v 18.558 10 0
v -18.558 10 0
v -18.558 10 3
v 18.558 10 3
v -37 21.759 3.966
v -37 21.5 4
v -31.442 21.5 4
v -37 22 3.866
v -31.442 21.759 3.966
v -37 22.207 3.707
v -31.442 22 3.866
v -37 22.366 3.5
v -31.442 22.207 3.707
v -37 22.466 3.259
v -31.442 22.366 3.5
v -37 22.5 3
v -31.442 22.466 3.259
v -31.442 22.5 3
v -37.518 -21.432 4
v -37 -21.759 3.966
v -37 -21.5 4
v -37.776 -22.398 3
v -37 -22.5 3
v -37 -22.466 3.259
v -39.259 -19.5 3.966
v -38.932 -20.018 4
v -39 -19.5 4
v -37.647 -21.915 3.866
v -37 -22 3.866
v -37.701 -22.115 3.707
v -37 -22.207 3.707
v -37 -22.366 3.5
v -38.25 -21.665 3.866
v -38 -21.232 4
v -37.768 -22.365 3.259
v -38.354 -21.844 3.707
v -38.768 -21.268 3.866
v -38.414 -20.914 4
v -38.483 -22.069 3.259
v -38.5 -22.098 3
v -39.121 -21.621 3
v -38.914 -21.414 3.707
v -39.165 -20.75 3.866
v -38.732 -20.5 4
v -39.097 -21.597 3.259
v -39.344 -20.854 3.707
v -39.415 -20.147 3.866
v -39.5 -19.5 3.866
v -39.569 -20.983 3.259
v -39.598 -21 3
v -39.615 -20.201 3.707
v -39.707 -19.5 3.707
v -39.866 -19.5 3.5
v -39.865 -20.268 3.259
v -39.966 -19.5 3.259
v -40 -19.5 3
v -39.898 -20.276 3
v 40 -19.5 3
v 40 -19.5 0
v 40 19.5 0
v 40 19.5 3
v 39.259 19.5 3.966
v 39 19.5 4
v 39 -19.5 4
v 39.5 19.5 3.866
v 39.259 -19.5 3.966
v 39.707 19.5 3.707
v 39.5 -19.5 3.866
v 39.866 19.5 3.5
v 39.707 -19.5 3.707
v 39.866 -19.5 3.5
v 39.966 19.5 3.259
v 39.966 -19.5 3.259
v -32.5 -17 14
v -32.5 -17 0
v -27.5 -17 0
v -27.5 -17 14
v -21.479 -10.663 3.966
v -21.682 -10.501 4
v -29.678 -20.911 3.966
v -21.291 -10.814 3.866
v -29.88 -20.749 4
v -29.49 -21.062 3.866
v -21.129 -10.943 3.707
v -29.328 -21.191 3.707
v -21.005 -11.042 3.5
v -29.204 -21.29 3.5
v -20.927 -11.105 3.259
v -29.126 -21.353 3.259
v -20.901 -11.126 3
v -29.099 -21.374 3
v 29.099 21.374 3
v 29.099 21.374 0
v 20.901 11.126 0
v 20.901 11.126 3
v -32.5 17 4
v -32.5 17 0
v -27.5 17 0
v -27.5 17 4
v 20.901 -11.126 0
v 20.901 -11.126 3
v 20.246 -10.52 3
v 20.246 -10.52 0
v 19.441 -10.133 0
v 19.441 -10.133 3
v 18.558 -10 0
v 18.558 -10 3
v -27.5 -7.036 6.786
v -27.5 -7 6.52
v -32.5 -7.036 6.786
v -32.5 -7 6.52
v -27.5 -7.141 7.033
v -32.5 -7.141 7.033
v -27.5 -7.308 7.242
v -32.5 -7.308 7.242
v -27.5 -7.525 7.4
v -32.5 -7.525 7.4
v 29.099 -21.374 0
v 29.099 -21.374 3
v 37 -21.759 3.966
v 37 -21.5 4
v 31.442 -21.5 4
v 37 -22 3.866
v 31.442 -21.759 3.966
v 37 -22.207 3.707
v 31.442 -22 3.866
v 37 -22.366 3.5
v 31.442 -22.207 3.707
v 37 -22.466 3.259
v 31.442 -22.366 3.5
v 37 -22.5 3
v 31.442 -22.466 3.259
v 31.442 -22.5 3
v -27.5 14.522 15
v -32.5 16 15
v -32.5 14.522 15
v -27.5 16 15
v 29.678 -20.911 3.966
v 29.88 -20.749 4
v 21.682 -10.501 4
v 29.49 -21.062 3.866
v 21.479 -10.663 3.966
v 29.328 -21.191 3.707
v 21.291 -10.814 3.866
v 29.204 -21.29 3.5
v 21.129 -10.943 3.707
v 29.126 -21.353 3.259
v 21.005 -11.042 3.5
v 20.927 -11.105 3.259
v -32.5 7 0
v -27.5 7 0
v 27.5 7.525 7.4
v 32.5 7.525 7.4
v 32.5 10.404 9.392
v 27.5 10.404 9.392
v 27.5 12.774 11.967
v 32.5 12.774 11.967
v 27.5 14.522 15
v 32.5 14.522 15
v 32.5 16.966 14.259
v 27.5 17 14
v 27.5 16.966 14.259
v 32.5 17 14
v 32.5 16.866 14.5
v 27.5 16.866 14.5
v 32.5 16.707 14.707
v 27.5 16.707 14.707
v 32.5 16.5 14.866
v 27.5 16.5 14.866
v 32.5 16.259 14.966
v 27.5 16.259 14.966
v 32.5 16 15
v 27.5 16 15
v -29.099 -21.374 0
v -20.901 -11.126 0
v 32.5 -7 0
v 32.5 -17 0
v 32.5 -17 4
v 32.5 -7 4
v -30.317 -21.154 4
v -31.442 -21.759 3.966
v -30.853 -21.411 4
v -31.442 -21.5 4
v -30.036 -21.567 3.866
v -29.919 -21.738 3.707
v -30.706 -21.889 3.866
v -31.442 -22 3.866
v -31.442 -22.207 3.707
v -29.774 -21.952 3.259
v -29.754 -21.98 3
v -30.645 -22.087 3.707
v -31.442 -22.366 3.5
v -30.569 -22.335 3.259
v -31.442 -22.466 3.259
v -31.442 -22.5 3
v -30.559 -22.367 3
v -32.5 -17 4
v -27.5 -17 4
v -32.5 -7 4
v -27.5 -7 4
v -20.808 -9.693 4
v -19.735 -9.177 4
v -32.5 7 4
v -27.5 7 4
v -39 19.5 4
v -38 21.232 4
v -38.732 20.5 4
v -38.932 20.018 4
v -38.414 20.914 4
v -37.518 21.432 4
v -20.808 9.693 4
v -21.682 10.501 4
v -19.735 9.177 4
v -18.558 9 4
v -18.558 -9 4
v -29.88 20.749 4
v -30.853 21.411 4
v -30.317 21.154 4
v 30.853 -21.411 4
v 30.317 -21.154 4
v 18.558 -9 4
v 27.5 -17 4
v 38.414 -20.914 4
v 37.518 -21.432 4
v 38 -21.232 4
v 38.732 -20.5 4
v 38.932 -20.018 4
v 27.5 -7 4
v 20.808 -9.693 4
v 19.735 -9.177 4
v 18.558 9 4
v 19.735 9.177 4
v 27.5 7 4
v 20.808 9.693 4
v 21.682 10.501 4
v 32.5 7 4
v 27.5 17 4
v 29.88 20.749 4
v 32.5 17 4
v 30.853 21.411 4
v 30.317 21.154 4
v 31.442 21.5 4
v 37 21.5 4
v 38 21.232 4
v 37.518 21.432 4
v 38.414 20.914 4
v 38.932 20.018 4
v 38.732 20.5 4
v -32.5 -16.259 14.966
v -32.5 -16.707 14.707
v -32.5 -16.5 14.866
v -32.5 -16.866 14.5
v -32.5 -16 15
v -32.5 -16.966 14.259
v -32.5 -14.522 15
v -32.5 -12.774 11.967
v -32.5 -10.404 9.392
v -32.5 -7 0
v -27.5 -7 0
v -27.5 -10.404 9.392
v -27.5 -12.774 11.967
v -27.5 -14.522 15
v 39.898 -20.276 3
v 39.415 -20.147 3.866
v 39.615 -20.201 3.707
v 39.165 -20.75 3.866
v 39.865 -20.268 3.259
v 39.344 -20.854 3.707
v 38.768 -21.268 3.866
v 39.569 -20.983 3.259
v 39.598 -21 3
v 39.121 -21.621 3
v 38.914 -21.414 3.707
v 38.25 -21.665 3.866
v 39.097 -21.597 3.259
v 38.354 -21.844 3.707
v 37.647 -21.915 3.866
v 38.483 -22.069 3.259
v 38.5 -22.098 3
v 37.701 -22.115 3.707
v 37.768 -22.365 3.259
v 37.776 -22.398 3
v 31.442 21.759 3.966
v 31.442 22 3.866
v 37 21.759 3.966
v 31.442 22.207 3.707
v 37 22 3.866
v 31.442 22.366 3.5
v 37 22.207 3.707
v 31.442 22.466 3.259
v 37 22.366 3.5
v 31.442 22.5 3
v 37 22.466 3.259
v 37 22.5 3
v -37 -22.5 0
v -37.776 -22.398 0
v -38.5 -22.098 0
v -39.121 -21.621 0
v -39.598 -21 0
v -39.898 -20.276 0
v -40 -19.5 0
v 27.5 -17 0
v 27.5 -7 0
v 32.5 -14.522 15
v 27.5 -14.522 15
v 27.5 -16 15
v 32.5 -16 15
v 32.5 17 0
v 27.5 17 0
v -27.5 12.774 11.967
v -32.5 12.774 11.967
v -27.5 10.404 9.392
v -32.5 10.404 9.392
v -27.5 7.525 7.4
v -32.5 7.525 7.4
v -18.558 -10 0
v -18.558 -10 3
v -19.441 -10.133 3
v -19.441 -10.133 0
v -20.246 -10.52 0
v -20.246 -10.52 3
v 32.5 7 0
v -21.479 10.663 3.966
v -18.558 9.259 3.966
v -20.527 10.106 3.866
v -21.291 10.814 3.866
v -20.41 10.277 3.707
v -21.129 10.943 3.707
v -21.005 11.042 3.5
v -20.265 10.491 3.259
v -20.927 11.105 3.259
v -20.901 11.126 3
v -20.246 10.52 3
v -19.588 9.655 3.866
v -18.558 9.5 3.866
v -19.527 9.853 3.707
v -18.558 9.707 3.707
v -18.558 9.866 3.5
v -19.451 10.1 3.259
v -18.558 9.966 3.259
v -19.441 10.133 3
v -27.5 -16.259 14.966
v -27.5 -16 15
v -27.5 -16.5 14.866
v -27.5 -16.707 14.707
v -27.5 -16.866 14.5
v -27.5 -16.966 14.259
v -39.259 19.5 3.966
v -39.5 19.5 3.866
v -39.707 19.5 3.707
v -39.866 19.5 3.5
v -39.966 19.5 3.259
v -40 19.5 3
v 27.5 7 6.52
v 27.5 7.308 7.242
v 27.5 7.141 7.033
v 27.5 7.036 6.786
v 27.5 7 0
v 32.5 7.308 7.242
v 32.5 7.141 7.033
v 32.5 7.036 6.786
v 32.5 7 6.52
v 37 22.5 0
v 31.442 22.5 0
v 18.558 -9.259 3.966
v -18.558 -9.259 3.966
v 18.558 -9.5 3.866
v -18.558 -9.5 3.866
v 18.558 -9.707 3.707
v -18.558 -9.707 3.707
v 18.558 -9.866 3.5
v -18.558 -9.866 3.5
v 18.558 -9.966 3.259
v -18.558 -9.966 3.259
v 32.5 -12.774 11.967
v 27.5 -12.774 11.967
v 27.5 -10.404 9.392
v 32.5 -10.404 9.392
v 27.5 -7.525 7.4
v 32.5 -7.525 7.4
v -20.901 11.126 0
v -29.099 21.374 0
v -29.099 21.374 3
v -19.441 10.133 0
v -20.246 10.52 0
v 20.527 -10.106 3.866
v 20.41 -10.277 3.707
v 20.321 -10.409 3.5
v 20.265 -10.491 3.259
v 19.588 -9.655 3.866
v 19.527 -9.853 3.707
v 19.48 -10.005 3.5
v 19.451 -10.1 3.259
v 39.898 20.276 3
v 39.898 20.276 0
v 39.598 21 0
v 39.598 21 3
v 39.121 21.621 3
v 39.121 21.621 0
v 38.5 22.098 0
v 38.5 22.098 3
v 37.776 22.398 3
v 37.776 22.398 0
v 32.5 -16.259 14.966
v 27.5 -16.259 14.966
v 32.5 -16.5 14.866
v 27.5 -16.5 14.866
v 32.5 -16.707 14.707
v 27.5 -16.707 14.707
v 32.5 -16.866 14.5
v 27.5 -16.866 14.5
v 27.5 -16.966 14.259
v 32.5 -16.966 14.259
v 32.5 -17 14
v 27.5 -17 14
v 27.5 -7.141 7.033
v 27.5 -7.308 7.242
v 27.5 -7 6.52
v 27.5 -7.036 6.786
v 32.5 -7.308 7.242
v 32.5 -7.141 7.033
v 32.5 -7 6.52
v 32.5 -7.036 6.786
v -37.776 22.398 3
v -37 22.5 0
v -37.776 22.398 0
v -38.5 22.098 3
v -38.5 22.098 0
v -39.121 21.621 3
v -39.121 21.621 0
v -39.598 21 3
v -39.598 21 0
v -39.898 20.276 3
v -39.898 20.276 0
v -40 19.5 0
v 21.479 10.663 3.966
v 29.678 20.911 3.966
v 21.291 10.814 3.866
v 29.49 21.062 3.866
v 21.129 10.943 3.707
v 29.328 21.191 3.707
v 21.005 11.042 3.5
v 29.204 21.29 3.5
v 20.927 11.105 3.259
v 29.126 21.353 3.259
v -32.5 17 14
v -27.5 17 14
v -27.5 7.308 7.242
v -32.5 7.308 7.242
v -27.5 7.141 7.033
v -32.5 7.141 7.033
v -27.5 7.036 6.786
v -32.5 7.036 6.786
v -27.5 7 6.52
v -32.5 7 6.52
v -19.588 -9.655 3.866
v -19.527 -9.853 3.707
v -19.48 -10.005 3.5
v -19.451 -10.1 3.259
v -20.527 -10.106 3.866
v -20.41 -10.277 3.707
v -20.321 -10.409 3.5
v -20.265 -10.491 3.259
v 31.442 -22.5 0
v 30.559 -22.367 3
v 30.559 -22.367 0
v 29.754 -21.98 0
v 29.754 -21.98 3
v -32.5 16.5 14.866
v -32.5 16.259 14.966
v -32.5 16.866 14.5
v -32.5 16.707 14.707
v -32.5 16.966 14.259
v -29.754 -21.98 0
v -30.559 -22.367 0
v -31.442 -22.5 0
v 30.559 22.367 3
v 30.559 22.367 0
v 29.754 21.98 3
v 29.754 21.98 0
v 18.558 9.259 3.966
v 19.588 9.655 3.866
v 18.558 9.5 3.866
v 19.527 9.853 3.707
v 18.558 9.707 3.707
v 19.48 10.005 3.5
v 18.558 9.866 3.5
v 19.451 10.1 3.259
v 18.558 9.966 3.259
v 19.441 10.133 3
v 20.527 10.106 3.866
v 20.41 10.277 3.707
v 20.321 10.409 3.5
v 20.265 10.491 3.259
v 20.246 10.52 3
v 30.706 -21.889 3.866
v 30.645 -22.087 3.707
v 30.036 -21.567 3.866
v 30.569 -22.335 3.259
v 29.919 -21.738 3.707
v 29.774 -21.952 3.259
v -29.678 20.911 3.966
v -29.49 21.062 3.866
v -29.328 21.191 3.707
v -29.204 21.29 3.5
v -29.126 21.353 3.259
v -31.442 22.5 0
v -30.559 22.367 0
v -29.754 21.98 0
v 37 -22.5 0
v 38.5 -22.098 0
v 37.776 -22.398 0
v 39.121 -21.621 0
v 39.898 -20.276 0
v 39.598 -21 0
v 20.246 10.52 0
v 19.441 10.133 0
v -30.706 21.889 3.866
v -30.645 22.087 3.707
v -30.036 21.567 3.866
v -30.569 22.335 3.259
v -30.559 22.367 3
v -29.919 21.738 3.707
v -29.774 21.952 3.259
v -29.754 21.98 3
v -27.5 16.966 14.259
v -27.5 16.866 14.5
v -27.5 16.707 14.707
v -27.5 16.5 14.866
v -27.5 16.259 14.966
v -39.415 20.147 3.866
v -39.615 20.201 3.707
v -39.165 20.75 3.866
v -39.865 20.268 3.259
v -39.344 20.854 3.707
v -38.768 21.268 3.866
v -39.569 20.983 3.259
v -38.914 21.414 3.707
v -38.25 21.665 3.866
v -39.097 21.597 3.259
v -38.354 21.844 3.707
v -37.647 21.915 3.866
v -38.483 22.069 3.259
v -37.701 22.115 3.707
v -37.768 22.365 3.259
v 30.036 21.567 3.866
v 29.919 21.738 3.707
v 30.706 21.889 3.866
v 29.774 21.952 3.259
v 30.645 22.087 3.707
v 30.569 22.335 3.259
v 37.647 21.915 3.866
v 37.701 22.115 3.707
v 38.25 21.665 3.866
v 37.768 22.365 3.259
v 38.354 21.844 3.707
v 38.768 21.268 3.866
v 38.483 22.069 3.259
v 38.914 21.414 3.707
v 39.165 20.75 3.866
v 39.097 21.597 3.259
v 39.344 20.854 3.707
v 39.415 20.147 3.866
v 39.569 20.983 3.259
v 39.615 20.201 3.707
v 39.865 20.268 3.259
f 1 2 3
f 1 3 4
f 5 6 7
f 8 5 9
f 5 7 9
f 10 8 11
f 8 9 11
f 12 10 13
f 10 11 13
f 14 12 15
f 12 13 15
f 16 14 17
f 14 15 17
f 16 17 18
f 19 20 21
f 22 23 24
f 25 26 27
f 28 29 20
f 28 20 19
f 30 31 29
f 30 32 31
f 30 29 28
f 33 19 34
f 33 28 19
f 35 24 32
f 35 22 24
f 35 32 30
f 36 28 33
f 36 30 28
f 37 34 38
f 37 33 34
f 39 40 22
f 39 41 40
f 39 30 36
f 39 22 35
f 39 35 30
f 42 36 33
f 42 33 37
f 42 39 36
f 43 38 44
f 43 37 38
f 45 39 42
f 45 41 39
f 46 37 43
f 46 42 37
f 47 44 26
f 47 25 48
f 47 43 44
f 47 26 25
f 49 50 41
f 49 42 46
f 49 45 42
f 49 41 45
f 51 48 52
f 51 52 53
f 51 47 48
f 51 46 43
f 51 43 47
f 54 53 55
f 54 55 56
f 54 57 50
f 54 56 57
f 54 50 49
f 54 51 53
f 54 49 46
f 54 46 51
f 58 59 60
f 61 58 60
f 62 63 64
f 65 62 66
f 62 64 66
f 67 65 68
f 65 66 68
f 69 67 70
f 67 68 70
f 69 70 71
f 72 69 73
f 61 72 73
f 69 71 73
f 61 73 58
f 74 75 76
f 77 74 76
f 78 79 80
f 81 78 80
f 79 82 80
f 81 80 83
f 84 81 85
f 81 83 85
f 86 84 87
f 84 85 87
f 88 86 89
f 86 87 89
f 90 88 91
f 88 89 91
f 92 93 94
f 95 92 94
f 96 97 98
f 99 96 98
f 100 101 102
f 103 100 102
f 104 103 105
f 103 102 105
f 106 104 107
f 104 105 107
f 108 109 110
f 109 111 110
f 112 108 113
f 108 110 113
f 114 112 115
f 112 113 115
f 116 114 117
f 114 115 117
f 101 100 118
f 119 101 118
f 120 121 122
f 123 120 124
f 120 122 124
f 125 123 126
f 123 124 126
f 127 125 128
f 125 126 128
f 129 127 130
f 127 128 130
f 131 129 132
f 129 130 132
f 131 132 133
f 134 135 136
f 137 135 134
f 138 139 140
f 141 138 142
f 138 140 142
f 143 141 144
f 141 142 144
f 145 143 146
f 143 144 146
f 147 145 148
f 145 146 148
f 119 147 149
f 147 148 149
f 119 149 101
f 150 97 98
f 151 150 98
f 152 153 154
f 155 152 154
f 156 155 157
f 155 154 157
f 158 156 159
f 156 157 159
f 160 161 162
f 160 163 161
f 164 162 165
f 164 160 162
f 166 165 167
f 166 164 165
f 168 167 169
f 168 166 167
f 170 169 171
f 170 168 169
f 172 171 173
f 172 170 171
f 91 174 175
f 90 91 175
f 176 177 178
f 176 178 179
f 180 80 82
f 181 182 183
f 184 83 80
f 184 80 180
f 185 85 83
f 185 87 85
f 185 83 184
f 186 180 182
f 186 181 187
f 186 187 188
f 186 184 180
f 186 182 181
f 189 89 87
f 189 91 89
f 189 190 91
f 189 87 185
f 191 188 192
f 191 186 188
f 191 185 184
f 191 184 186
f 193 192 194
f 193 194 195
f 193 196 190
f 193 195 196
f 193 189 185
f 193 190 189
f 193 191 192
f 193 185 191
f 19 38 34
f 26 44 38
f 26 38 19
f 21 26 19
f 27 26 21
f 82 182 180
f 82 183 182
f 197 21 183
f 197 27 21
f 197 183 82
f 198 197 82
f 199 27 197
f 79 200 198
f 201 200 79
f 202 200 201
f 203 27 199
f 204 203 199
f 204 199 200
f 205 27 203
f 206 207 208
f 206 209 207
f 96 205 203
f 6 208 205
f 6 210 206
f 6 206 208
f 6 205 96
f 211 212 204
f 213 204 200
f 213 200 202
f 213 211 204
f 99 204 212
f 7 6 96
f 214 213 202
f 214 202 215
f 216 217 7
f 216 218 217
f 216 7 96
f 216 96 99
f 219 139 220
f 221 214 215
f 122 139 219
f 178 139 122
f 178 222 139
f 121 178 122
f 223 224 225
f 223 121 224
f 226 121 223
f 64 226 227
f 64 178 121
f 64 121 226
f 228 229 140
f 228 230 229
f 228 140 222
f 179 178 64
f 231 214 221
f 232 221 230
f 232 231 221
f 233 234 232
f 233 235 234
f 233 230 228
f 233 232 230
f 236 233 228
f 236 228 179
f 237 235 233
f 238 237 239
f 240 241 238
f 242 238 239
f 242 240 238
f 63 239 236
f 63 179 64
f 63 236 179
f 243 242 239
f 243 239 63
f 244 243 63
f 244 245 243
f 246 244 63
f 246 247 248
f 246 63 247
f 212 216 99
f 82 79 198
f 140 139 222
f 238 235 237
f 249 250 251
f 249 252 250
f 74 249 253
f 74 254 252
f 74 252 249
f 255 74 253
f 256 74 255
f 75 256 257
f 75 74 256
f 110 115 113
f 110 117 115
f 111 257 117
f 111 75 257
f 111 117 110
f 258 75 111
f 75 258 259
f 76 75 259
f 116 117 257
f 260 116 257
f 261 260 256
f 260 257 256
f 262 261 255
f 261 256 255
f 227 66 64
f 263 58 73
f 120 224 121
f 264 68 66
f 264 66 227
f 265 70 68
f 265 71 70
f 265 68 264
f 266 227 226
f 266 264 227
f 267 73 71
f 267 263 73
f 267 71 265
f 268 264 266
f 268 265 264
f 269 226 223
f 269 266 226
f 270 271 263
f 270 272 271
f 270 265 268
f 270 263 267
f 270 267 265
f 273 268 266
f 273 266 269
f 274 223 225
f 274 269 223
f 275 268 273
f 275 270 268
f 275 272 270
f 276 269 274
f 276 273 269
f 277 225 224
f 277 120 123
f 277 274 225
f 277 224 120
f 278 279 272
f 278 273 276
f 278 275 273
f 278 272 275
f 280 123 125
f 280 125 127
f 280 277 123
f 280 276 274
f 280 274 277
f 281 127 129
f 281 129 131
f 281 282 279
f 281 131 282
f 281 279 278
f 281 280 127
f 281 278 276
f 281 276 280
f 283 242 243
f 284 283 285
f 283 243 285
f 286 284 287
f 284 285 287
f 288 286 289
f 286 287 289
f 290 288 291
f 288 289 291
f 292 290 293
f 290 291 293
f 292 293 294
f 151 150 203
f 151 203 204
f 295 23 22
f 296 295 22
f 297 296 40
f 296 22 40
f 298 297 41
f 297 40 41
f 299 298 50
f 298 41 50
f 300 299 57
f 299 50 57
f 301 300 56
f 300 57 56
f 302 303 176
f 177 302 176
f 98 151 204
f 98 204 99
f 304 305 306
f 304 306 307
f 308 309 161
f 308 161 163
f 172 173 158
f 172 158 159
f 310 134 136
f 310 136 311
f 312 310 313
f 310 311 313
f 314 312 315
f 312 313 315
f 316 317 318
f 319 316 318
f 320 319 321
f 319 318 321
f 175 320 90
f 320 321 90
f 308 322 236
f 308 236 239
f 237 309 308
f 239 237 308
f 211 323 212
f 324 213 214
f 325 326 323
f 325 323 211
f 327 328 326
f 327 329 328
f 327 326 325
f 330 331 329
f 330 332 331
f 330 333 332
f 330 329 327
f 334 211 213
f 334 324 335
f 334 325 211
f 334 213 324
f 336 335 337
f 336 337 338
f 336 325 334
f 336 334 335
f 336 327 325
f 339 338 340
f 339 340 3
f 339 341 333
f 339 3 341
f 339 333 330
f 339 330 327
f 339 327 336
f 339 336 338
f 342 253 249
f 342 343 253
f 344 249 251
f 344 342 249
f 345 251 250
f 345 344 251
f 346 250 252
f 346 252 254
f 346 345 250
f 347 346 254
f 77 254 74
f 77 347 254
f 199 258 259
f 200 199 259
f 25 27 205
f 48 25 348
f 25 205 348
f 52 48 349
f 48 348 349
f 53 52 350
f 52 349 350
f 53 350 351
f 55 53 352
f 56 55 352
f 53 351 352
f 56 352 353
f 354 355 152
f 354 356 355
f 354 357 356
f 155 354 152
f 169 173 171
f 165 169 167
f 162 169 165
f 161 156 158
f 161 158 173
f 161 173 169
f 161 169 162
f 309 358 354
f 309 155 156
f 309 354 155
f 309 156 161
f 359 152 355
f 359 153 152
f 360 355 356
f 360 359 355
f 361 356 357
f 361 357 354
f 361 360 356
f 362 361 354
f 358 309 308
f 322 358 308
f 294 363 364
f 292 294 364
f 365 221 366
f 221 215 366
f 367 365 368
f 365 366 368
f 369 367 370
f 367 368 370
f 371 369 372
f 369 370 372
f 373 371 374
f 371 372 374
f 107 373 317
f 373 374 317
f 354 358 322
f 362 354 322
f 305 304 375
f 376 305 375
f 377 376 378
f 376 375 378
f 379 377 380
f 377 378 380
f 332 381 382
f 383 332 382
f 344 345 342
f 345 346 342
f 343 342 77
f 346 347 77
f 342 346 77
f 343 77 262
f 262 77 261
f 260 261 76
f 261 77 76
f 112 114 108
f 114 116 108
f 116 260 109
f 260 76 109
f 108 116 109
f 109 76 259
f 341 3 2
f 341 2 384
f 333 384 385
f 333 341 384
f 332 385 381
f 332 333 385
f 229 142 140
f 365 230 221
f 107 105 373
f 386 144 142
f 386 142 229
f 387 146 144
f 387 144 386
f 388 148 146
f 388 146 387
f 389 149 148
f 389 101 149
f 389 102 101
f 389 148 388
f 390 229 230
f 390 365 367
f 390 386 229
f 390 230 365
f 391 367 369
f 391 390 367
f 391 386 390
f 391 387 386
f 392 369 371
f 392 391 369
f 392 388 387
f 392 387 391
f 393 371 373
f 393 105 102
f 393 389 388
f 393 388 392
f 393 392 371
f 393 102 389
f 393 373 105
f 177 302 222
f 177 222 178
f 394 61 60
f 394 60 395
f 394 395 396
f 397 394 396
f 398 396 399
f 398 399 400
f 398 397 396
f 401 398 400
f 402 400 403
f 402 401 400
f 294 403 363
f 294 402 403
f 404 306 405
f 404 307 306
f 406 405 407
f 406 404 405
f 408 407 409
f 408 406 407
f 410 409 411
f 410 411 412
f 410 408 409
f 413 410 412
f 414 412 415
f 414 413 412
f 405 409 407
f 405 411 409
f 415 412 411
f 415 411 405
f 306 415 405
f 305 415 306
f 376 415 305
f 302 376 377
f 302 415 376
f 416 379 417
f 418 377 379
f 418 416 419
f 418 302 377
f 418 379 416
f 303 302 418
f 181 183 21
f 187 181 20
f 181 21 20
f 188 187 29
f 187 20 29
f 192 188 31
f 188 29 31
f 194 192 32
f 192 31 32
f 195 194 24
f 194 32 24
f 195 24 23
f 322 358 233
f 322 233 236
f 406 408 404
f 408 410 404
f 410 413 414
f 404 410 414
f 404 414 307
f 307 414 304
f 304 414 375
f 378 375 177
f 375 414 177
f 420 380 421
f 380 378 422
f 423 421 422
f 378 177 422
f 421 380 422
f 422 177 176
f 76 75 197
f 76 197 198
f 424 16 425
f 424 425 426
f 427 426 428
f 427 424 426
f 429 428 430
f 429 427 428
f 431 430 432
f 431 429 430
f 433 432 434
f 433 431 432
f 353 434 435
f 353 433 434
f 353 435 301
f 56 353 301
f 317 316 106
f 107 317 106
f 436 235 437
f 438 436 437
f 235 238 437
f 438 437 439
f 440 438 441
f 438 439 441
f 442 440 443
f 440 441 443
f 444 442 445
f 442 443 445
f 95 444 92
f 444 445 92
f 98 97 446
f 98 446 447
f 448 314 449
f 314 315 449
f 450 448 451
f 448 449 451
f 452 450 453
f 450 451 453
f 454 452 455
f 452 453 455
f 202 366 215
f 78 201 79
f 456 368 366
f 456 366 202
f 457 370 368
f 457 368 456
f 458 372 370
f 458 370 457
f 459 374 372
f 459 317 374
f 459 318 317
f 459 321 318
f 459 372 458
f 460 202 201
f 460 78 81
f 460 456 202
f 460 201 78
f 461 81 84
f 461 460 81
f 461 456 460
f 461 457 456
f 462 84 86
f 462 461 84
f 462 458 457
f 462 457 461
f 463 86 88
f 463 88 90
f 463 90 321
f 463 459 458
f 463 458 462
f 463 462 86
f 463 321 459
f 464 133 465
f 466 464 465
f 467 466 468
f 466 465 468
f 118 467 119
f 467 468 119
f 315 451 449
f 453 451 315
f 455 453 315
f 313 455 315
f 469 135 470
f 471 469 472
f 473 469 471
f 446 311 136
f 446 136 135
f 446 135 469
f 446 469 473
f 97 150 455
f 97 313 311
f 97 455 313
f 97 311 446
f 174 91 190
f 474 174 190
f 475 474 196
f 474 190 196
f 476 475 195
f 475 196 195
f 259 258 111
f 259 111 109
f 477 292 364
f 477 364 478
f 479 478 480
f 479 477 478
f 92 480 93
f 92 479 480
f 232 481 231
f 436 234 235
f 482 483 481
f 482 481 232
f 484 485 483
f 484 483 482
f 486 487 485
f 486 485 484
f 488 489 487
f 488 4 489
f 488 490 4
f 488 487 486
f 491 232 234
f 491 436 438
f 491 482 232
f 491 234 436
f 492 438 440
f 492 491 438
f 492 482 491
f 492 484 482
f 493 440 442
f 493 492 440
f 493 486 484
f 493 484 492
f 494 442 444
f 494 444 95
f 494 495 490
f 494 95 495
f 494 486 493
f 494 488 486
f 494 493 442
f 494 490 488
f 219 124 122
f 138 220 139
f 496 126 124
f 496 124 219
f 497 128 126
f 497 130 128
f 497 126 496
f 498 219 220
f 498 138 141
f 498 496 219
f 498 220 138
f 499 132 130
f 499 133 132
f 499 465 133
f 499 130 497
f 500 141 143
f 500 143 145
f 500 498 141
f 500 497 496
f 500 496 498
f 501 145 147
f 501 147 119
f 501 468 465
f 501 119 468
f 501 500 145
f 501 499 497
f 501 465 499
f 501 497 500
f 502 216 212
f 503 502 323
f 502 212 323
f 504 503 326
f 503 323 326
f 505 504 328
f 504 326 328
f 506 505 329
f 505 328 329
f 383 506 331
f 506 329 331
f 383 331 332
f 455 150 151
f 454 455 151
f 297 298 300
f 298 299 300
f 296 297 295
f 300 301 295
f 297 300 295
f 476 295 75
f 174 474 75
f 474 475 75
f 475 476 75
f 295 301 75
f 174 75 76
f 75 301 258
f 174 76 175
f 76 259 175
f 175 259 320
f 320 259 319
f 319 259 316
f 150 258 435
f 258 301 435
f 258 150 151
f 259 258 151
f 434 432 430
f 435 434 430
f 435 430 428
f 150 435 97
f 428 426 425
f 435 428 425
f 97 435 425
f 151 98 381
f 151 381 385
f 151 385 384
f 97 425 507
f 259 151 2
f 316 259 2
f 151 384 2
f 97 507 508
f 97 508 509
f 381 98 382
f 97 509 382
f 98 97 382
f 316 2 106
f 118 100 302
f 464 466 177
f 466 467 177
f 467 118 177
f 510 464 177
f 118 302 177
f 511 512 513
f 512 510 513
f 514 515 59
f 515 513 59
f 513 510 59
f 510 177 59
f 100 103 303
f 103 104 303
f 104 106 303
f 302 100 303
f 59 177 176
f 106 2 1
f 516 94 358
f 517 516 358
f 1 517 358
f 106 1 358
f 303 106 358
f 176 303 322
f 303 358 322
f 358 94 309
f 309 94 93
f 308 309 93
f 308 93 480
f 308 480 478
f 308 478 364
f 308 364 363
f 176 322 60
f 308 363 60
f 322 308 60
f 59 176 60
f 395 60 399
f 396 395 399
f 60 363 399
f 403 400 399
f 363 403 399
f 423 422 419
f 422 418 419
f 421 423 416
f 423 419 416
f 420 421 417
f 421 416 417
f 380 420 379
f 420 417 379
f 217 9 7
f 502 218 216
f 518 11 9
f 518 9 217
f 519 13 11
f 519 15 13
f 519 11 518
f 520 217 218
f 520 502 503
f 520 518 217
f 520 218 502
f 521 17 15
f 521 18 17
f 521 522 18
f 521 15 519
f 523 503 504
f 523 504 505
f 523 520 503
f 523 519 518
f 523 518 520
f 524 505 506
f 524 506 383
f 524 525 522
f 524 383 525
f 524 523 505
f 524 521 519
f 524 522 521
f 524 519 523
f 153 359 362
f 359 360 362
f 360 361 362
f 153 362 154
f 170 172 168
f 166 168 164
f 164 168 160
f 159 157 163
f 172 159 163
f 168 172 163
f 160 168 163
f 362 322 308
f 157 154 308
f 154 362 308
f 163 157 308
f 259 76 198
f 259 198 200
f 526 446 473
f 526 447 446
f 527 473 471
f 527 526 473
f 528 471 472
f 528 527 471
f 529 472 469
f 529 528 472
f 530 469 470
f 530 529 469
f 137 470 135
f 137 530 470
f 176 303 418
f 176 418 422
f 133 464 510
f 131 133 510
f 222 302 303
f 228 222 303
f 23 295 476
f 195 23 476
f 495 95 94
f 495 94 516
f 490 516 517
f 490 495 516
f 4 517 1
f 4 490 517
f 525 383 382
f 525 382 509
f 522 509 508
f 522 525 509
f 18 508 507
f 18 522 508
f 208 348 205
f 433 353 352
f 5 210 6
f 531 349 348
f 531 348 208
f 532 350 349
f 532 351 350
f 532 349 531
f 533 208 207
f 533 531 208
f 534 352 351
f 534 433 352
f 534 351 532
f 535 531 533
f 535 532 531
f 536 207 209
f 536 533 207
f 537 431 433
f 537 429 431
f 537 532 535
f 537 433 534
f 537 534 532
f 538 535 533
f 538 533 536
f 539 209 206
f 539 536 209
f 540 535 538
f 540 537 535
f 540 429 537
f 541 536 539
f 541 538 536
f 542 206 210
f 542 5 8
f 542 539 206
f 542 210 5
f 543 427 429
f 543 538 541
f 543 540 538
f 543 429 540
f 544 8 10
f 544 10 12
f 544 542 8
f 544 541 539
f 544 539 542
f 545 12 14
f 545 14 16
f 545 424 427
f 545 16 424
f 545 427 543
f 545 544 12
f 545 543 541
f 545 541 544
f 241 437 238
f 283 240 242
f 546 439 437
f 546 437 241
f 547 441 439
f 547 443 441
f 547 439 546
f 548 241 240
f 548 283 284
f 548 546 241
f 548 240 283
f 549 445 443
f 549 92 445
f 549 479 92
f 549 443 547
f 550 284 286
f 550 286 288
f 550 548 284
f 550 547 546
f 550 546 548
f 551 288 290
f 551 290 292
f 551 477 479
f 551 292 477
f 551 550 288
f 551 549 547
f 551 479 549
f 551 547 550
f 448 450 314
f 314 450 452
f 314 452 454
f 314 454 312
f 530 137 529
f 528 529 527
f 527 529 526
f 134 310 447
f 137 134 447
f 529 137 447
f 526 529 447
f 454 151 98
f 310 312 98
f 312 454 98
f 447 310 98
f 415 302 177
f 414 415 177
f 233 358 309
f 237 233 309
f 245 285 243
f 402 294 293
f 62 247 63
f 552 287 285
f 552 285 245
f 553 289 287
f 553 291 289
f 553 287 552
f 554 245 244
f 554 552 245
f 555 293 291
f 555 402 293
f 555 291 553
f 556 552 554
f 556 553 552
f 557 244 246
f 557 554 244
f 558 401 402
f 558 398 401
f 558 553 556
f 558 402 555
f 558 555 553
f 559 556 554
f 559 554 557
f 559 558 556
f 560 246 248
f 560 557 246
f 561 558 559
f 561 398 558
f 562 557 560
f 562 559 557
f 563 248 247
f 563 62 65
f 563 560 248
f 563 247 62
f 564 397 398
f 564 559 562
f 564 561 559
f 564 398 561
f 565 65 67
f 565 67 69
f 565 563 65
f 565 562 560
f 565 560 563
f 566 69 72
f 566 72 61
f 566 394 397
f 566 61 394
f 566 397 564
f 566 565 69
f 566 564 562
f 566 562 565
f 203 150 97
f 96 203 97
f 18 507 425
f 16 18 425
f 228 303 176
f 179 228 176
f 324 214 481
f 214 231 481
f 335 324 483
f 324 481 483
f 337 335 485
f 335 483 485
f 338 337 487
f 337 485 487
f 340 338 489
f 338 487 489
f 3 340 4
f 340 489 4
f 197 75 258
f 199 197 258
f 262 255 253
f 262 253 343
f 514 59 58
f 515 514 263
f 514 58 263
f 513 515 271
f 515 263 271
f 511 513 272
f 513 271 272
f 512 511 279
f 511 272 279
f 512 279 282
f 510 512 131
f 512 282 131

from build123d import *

# Parameters (mm, degrees)
F0_W     = 5
F0_H     = 10
F1_DEPTH = 15
F0_W_2   = 40
F0_H_2   = 20
F2_DEPTH = 4
F3_R     = 3
F5_DEPTH = 5
F6_R     = 15.85
F7_DEPTH = 5
F8_R     = 1
F8_2_R   = 1
F8_3_R   = 1
F8_4_R   = 1
F9_R     = 1


with BuildPart() as f1:
    # F0 (on Top) → F1 (new body)
    with BuildSketch(Plane.XY):
        with Locations((-30, 12)):
            Rectangle(F0_W, F0_H)
    extrude(amount=F1_DEPTH)


with BuildPart() as f1b:
    # F0 (on Top) → F1, piece 2 (new body)
    with BuildSketch(Plane.XY):
        with Locations((-30, -12)):
            Rectangle(F0_W, F0_H)
    extrude(amount=F1_DEPTH)


with BuildPart() as f1c:
    # F0 (on Top) → F1, piece 3 (new body)
    with BuildSketch(Plane.XY):
        with Locations((30, 12)):
            Rectangle(F0_W, F0_H)
    extrude(amount=F1_DEPTH)


with BuildPart() as f1d:
    # F0 (on Top) → F1, piece 4 (new body)
    with BuildSketch(Plane.XY):
        with Locations((30, -12)):
            Rectangle(F0_W, F0_H)
    extrude(amount=F1_DEPTH)


with BuildPart() as f2:
    # F0 (on Top) → F2 (new body)
    with BuildSketch(Plane.XY):
        Polygon((40, -22.5), (40, 22.5), (30, 22.5), (20, 10), (20, -10), (30, -22.5), align=None)
        with Locations((30, -12)):
            Rectangle(F0_W, F0_H, mode=Mode.SUBTRACT)
        with Locations((30, 12)):
            Rectangle(F0_W, F0_H, mode=Mode.SUBTRACT)
        Rectangle(F0_W_2, F0_H_2)
        Polygon((-20, -10), (-20, 10), (-30, 22.5), (-40, 22.5), (-40, -22.5), (-30, -22.5), align=None)
        with Locations((-30, -12)):
            Rectangle(F0_W, F0_H, mode=Mode.SUBTRACT)
        with Locations((-30, 12)):
            Rectangle(F0_W, F0_H, mode=Mode.SUBTRACT)
    extrude(amount=F2_DEPTH)

    # F3
    f3_edges = [f2.edges().sort_by_distance(p)[0] for p in [
        (-40, 22.5, 2),
        (-40, -22.5, 2),
        (40, -22.5, 2),
        (40, 22.5, 2),
        (-30, 22.5, 2),
        (30, 22.5, 2),
        (30, -22.5, 2),
        (-30, -22.5, 2),
        (-20, -10, 2),
        (-20, 10, 2),
        (20, -10, 2),
        (20, 10, 2),
    ]]
    fillet(f3_edges, radius=F3_R)

    # F9
    f9_edges = [f2.edges().sort_by_distance(p)[0] for p in [
        (0, 10, 4),
    ]]
    fillet(f9_edges, radius=F9_R)


with BuildPart() as f5_tool:
    # F4 (on face) → F5 (new body)
    with BuildSketch(Plane.YZ.offset(32.5)):
        with BuildLine():
            ThreePointArc((-7, 7.1295042281), (8.3747388019, 7.8931708787), (15.85, 21.35))
            ThreePointArc((15.85, 21.35), (-3.2436488351, 36.8645493726), (-14.5223964964, 15))
            Line((-14.5223964964, 15), (-7, 15))
            Line((-7, 15), (-7, 7.1295042281))
        make_face()
        with BuildLine():
            Line((-7, 15), (-14.5223964964, 15))
            ThreePointArc((-14.5223964964, 15), (-11.458165807, 10.398610301), (-7, 7.1295042281))
            Line((-7, 7.1295042281), (-7, 15))
        make_face()
    extrude(amount=-F5_DEPTH)


with BuildPart() as f1c_1:
    add(f1c.part)

    # F5: cut by f5_tool
    add(f5_tool.part, mode=Mode.SUBTRACT)

    # F8#2
    f8_2_edges = [f1c_1.edges().sort_by_distance(p)[0] for p in [
        (30, 17, 15),
        (30, 7, 7.129504),
    ]]
    fillet(f8_2_edges, radius=F8_2_R)


with BuildPart() as f1d_1:
    add(f1d.part)

    # F5: cut by f5_tool
    add(f5_tool.part, mode=Mode.SUBTRACT)

    # F8#4
    f8_4_edges = [f1d_1.edges().sort_by_distance(p)[0] for p in [
        (30, -17, 15),
        (30, -7, 7.129504),
    ]]
    fillet(f8_4_edges, radius=F8_4_R)


with BuildPart() as f7_tool:
    # F6 (on face) → F7 (new body)
    with BuildSketch(Plane(origin=(-32.5, 0, 0), x_dir=(0, -1, 0), z_dir=(-1, 0, 0))):
        with Locations((0, 21.35)):
            Circle(F6_R)
    extrude(amount=-F7_DEPTH)


with BuildPart() as f1_1:
    add(f1.part)

    # F7: cut by f7_tool
    add(f7_tool.part, mode=Mode.SUBTRACT)

    # F8
    f8_edges = [f1_1.edges().sort_by_distance(p)[0] for p in [
        (-30, 17, 15),
        (-30, 7, 7.129504),
    ]]
    fillet(f8_edges, radius=F8_R)


with BuildPart() as f1b_1:
    add(f1b.part)

    # F7: cut by f7_tool
    add(f7_tool.part, mode=Mode.SUBTRACT)

    # F8#3
    f8_3_edges = [f1b_1.edges().sort_by_distance(p)[0] for p in [
        (-30, -17, 15),
        (-30, -7, 7.129504),
    ]]
    fillet(f8_3_edges, radius=F8_3_R)


solid = Compound([f2.part, f1c_1.part, f1d_1.part, f1_1.part, f1b_1.part])
